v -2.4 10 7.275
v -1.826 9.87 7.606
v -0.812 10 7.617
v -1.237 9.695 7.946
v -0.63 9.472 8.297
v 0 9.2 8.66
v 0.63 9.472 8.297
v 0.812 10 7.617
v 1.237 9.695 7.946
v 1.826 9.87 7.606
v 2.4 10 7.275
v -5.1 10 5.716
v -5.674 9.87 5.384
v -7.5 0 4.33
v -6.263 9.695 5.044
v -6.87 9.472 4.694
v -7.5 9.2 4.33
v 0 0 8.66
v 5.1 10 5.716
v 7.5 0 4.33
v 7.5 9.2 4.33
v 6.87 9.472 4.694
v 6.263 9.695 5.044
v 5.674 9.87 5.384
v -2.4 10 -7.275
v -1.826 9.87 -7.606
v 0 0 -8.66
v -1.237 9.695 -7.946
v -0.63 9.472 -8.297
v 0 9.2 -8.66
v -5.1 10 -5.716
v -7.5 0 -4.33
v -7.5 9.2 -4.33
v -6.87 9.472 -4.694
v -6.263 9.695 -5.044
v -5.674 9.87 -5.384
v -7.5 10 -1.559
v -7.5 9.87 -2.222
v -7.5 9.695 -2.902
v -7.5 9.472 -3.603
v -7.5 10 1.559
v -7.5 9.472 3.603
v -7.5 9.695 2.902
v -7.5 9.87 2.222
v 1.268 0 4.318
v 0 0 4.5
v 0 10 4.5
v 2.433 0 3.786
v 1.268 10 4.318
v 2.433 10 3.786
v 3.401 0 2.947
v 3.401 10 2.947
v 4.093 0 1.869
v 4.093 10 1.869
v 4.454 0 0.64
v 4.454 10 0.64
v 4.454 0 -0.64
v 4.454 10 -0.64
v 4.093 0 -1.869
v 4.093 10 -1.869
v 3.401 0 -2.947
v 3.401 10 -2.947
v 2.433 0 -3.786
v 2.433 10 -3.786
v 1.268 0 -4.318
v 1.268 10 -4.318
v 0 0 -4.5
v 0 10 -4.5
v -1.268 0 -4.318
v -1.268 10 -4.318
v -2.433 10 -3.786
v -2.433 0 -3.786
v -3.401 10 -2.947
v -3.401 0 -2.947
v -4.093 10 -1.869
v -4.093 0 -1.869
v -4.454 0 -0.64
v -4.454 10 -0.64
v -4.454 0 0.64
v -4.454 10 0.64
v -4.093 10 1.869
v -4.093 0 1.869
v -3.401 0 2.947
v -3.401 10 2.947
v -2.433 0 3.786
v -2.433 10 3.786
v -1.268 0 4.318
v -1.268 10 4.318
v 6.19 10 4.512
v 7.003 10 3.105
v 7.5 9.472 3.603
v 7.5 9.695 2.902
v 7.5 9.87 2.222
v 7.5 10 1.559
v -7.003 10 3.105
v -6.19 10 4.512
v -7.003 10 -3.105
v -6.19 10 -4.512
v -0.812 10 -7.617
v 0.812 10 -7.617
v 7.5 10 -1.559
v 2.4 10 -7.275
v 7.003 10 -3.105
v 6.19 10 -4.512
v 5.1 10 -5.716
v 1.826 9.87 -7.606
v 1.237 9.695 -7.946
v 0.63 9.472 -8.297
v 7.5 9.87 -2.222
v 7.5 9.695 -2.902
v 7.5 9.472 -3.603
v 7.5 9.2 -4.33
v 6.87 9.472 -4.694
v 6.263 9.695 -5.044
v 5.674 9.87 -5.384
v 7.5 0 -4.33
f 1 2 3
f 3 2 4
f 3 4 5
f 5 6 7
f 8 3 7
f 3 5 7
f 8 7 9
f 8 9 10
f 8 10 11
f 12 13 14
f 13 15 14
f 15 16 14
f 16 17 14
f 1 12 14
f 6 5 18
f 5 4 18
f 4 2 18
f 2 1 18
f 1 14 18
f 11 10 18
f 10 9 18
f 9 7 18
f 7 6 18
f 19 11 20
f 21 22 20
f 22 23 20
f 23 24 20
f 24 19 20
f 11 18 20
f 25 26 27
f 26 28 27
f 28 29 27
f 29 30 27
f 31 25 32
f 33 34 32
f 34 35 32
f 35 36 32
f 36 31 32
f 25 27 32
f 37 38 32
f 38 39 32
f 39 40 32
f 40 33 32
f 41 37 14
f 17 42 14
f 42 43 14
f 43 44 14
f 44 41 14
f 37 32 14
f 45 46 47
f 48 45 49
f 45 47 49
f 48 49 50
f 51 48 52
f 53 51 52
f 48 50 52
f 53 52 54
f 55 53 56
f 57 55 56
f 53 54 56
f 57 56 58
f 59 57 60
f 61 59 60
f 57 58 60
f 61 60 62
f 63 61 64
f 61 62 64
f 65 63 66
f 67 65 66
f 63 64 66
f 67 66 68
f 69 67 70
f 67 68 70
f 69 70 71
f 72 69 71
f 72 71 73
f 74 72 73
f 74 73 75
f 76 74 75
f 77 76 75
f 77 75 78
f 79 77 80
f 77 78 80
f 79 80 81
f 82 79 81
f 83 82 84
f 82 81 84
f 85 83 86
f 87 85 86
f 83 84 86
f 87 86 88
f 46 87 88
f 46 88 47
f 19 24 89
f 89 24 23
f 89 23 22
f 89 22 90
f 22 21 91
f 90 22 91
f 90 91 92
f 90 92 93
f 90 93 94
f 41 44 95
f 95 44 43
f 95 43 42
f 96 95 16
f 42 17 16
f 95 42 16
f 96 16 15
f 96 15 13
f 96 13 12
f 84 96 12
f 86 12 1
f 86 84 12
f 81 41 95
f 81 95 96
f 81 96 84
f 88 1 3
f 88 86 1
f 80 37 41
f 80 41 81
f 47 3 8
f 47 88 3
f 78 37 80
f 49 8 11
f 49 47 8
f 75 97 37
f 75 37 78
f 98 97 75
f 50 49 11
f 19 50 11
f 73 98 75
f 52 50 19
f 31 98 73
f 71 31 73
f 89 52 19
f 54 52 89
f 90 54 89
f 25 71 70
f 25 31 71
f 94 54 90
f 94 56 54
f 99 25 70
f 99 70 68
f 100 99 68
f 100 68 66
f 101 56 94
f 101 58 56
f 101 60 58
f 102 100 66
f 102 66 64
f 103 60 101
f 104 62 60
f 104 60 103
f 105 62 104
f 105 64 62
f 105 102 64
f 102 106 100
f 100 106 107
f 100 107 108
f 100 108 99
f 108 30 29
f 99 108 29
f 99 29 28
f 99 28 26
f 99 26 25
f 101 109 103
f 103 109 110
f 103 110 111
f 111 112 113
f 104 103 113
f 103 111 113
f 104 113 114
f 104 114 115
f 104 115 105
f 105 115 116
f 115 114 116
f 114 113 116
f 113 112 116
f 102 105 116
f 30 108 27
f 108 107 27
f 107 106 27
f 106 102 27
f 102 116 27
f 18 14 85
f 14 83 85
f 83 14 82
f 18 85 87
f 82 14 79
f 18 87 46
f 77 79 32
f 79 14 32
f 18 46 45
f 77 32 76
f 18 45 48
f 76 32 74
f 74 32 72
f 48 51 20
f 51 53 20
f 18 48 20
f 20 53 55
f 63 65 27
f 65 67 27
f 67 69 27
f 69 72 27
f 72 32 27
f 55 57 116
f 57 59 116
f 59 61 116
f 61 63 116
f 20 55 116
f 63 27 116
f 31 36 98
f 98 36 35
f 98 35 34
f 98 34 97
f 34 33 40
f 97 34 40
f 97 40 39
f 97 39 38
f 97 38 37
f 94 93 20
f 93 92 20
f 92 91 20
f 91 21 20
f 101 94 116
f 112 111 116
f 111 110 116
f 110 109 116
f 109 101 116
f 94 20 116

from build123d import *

# Parameters (mm, degrees)
BOSS_EXTRUDE1_DEPTH = 10
SKETCH2_R           = 4.5
CUT_EXTRUDE1_DEPTH  = 10


with BuildPart() as part:
    # Sketch1 → Boss-Extrude1 (new body)
    with BuildSketch(Plane(origin=(0, 0, 0), x_dir=(1, 0, 0), z_dir=(0, 1, 0))):
        Polygon((7.5, 4.330127019), (0, 8.660254038), (-7.5, 4.330127019), (-7.5, -4.330127019), (0, -8.660254038), (7.5, -4.330127019), align=None)
    extrude(amount=BOSS_EXTRUDE1_DEPTH)

    # Sketch3 → Cut-Revolve1 (revolve, cut)
    with BuildSketch(Plane(origin=(0, 0, 0), x_dir=(0, 0, -1), z_dir=(1, 0, 0))):
        Polygon((-8.660254038, 10), (-7.660254038, 10), (-8.660254038, 9.2), align=None)
    revolve(axis=Axis((0, 0, 0), (0, 1, 0)), mode=Mode.SUBTRACT)

    # Sketch2 → Cut-Extrude1 (cut)
    with BuildSketch(Plane(origin=(0, 10, 0), x_dir=(1, 0, 0), z_dir=(0, 1, 0))):
        with Locations(Location((0, 0, 0), (0, 0, 270))):
            Circle(SKETCH2_R)
    extrude(amount=-CUT_EXTRUDE1_DEPTH, mode=Mode.SUBTRACT)


solid = part.part
